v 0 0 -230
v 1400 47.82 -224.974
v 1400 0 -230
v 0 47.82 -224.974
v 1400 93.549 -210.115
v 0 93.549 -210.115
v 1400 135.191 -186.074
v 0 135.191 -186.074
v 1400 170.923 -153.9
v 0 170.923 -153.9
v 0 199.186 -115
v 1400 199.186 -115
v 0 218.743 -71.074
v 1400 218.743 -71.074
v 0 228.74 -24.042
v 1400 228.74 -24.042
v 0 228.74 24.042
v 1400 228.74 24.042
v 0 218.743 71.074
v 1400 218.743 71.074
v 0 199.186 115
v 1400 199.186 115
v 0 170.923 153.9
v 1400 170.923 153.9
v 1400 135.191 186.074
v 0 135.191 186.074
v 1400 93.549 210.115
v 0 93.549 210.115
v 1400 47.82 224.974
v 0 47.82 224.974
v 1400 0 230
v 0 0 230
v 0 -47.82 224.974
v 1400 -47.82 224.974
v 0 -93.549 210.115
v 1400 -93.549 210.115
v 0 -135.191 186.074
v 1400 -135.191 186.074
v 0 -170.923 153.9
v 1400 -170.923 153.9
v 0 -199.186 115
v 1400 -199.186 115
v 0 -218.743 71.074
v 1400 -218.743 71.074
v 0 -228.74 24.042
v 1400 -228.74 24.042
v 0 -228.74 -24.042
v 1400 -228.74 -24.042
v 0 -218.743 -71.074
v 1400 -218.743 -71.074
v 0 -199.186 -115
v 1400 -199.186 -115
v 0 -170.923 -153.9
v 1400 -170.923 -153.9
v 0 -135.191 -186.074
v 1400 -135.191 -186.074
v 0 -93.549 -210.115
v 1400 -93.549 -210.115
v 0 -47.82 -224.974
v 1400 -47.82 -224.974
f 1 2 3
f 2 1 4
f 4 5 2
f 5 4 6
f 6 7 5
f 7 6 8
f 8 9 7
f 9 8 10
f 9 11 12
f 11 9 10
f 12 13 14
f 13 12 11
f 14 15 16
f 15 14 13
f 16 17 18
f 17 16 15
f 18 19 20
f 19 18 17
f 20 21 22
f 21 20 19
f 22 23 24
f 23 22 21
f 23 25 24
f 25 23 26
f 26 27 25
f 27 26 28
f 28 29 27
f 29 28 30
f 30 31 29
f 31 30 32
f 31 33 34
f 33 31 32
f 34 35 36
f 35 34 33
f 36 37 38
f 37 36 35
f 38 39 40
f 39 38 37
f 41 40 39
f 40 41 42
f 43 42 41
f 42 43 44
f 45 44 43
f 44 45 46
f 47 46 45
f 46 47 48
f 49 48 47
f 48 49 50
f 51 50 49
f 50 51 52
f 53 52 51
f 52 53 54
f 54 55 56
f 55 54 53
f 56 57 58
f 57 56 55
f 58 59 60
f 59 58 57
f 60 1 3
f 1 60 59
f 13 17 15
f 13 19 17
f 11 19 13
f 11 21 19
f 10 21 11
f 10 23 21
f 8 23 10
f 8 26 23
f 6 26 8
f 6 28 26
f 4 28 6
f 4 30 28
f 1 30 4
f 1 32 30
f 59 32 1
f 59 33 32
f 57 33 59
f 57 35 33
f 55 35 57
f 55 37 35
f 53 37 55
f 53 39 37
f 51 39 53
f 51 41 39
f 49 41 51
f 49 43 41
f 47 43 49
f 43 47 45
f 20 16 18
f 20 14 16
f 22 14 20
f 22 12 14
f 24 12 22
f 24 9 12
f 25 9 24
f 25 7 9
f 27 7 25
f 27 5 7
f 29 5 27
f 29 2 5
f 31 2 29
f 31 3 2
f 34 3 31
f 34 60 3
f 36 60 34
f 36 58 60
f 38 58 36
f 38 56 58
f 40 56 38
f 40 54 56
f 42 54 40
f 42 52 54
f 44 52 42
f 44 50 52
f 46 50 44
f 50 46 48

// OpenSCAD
// CSG file generated from FreeCAD 0.18.15221 (Git)
group() {
 group(){
multmatrix([[2.22044604925e-16, 0.0, 1.0,            0.0], [0.0, 1.0, 0.0, 0.0], [-1.0, 0.0, 2.22044604925e-16, 0.0], [             0, 0, 0, 1]]){
cylinder($fn = 0, $fa = 12.000000, $fs = 2.000000, h = 1400.0, r1 = 230.0, r2 = 230.0, center = false);
}
}
}
